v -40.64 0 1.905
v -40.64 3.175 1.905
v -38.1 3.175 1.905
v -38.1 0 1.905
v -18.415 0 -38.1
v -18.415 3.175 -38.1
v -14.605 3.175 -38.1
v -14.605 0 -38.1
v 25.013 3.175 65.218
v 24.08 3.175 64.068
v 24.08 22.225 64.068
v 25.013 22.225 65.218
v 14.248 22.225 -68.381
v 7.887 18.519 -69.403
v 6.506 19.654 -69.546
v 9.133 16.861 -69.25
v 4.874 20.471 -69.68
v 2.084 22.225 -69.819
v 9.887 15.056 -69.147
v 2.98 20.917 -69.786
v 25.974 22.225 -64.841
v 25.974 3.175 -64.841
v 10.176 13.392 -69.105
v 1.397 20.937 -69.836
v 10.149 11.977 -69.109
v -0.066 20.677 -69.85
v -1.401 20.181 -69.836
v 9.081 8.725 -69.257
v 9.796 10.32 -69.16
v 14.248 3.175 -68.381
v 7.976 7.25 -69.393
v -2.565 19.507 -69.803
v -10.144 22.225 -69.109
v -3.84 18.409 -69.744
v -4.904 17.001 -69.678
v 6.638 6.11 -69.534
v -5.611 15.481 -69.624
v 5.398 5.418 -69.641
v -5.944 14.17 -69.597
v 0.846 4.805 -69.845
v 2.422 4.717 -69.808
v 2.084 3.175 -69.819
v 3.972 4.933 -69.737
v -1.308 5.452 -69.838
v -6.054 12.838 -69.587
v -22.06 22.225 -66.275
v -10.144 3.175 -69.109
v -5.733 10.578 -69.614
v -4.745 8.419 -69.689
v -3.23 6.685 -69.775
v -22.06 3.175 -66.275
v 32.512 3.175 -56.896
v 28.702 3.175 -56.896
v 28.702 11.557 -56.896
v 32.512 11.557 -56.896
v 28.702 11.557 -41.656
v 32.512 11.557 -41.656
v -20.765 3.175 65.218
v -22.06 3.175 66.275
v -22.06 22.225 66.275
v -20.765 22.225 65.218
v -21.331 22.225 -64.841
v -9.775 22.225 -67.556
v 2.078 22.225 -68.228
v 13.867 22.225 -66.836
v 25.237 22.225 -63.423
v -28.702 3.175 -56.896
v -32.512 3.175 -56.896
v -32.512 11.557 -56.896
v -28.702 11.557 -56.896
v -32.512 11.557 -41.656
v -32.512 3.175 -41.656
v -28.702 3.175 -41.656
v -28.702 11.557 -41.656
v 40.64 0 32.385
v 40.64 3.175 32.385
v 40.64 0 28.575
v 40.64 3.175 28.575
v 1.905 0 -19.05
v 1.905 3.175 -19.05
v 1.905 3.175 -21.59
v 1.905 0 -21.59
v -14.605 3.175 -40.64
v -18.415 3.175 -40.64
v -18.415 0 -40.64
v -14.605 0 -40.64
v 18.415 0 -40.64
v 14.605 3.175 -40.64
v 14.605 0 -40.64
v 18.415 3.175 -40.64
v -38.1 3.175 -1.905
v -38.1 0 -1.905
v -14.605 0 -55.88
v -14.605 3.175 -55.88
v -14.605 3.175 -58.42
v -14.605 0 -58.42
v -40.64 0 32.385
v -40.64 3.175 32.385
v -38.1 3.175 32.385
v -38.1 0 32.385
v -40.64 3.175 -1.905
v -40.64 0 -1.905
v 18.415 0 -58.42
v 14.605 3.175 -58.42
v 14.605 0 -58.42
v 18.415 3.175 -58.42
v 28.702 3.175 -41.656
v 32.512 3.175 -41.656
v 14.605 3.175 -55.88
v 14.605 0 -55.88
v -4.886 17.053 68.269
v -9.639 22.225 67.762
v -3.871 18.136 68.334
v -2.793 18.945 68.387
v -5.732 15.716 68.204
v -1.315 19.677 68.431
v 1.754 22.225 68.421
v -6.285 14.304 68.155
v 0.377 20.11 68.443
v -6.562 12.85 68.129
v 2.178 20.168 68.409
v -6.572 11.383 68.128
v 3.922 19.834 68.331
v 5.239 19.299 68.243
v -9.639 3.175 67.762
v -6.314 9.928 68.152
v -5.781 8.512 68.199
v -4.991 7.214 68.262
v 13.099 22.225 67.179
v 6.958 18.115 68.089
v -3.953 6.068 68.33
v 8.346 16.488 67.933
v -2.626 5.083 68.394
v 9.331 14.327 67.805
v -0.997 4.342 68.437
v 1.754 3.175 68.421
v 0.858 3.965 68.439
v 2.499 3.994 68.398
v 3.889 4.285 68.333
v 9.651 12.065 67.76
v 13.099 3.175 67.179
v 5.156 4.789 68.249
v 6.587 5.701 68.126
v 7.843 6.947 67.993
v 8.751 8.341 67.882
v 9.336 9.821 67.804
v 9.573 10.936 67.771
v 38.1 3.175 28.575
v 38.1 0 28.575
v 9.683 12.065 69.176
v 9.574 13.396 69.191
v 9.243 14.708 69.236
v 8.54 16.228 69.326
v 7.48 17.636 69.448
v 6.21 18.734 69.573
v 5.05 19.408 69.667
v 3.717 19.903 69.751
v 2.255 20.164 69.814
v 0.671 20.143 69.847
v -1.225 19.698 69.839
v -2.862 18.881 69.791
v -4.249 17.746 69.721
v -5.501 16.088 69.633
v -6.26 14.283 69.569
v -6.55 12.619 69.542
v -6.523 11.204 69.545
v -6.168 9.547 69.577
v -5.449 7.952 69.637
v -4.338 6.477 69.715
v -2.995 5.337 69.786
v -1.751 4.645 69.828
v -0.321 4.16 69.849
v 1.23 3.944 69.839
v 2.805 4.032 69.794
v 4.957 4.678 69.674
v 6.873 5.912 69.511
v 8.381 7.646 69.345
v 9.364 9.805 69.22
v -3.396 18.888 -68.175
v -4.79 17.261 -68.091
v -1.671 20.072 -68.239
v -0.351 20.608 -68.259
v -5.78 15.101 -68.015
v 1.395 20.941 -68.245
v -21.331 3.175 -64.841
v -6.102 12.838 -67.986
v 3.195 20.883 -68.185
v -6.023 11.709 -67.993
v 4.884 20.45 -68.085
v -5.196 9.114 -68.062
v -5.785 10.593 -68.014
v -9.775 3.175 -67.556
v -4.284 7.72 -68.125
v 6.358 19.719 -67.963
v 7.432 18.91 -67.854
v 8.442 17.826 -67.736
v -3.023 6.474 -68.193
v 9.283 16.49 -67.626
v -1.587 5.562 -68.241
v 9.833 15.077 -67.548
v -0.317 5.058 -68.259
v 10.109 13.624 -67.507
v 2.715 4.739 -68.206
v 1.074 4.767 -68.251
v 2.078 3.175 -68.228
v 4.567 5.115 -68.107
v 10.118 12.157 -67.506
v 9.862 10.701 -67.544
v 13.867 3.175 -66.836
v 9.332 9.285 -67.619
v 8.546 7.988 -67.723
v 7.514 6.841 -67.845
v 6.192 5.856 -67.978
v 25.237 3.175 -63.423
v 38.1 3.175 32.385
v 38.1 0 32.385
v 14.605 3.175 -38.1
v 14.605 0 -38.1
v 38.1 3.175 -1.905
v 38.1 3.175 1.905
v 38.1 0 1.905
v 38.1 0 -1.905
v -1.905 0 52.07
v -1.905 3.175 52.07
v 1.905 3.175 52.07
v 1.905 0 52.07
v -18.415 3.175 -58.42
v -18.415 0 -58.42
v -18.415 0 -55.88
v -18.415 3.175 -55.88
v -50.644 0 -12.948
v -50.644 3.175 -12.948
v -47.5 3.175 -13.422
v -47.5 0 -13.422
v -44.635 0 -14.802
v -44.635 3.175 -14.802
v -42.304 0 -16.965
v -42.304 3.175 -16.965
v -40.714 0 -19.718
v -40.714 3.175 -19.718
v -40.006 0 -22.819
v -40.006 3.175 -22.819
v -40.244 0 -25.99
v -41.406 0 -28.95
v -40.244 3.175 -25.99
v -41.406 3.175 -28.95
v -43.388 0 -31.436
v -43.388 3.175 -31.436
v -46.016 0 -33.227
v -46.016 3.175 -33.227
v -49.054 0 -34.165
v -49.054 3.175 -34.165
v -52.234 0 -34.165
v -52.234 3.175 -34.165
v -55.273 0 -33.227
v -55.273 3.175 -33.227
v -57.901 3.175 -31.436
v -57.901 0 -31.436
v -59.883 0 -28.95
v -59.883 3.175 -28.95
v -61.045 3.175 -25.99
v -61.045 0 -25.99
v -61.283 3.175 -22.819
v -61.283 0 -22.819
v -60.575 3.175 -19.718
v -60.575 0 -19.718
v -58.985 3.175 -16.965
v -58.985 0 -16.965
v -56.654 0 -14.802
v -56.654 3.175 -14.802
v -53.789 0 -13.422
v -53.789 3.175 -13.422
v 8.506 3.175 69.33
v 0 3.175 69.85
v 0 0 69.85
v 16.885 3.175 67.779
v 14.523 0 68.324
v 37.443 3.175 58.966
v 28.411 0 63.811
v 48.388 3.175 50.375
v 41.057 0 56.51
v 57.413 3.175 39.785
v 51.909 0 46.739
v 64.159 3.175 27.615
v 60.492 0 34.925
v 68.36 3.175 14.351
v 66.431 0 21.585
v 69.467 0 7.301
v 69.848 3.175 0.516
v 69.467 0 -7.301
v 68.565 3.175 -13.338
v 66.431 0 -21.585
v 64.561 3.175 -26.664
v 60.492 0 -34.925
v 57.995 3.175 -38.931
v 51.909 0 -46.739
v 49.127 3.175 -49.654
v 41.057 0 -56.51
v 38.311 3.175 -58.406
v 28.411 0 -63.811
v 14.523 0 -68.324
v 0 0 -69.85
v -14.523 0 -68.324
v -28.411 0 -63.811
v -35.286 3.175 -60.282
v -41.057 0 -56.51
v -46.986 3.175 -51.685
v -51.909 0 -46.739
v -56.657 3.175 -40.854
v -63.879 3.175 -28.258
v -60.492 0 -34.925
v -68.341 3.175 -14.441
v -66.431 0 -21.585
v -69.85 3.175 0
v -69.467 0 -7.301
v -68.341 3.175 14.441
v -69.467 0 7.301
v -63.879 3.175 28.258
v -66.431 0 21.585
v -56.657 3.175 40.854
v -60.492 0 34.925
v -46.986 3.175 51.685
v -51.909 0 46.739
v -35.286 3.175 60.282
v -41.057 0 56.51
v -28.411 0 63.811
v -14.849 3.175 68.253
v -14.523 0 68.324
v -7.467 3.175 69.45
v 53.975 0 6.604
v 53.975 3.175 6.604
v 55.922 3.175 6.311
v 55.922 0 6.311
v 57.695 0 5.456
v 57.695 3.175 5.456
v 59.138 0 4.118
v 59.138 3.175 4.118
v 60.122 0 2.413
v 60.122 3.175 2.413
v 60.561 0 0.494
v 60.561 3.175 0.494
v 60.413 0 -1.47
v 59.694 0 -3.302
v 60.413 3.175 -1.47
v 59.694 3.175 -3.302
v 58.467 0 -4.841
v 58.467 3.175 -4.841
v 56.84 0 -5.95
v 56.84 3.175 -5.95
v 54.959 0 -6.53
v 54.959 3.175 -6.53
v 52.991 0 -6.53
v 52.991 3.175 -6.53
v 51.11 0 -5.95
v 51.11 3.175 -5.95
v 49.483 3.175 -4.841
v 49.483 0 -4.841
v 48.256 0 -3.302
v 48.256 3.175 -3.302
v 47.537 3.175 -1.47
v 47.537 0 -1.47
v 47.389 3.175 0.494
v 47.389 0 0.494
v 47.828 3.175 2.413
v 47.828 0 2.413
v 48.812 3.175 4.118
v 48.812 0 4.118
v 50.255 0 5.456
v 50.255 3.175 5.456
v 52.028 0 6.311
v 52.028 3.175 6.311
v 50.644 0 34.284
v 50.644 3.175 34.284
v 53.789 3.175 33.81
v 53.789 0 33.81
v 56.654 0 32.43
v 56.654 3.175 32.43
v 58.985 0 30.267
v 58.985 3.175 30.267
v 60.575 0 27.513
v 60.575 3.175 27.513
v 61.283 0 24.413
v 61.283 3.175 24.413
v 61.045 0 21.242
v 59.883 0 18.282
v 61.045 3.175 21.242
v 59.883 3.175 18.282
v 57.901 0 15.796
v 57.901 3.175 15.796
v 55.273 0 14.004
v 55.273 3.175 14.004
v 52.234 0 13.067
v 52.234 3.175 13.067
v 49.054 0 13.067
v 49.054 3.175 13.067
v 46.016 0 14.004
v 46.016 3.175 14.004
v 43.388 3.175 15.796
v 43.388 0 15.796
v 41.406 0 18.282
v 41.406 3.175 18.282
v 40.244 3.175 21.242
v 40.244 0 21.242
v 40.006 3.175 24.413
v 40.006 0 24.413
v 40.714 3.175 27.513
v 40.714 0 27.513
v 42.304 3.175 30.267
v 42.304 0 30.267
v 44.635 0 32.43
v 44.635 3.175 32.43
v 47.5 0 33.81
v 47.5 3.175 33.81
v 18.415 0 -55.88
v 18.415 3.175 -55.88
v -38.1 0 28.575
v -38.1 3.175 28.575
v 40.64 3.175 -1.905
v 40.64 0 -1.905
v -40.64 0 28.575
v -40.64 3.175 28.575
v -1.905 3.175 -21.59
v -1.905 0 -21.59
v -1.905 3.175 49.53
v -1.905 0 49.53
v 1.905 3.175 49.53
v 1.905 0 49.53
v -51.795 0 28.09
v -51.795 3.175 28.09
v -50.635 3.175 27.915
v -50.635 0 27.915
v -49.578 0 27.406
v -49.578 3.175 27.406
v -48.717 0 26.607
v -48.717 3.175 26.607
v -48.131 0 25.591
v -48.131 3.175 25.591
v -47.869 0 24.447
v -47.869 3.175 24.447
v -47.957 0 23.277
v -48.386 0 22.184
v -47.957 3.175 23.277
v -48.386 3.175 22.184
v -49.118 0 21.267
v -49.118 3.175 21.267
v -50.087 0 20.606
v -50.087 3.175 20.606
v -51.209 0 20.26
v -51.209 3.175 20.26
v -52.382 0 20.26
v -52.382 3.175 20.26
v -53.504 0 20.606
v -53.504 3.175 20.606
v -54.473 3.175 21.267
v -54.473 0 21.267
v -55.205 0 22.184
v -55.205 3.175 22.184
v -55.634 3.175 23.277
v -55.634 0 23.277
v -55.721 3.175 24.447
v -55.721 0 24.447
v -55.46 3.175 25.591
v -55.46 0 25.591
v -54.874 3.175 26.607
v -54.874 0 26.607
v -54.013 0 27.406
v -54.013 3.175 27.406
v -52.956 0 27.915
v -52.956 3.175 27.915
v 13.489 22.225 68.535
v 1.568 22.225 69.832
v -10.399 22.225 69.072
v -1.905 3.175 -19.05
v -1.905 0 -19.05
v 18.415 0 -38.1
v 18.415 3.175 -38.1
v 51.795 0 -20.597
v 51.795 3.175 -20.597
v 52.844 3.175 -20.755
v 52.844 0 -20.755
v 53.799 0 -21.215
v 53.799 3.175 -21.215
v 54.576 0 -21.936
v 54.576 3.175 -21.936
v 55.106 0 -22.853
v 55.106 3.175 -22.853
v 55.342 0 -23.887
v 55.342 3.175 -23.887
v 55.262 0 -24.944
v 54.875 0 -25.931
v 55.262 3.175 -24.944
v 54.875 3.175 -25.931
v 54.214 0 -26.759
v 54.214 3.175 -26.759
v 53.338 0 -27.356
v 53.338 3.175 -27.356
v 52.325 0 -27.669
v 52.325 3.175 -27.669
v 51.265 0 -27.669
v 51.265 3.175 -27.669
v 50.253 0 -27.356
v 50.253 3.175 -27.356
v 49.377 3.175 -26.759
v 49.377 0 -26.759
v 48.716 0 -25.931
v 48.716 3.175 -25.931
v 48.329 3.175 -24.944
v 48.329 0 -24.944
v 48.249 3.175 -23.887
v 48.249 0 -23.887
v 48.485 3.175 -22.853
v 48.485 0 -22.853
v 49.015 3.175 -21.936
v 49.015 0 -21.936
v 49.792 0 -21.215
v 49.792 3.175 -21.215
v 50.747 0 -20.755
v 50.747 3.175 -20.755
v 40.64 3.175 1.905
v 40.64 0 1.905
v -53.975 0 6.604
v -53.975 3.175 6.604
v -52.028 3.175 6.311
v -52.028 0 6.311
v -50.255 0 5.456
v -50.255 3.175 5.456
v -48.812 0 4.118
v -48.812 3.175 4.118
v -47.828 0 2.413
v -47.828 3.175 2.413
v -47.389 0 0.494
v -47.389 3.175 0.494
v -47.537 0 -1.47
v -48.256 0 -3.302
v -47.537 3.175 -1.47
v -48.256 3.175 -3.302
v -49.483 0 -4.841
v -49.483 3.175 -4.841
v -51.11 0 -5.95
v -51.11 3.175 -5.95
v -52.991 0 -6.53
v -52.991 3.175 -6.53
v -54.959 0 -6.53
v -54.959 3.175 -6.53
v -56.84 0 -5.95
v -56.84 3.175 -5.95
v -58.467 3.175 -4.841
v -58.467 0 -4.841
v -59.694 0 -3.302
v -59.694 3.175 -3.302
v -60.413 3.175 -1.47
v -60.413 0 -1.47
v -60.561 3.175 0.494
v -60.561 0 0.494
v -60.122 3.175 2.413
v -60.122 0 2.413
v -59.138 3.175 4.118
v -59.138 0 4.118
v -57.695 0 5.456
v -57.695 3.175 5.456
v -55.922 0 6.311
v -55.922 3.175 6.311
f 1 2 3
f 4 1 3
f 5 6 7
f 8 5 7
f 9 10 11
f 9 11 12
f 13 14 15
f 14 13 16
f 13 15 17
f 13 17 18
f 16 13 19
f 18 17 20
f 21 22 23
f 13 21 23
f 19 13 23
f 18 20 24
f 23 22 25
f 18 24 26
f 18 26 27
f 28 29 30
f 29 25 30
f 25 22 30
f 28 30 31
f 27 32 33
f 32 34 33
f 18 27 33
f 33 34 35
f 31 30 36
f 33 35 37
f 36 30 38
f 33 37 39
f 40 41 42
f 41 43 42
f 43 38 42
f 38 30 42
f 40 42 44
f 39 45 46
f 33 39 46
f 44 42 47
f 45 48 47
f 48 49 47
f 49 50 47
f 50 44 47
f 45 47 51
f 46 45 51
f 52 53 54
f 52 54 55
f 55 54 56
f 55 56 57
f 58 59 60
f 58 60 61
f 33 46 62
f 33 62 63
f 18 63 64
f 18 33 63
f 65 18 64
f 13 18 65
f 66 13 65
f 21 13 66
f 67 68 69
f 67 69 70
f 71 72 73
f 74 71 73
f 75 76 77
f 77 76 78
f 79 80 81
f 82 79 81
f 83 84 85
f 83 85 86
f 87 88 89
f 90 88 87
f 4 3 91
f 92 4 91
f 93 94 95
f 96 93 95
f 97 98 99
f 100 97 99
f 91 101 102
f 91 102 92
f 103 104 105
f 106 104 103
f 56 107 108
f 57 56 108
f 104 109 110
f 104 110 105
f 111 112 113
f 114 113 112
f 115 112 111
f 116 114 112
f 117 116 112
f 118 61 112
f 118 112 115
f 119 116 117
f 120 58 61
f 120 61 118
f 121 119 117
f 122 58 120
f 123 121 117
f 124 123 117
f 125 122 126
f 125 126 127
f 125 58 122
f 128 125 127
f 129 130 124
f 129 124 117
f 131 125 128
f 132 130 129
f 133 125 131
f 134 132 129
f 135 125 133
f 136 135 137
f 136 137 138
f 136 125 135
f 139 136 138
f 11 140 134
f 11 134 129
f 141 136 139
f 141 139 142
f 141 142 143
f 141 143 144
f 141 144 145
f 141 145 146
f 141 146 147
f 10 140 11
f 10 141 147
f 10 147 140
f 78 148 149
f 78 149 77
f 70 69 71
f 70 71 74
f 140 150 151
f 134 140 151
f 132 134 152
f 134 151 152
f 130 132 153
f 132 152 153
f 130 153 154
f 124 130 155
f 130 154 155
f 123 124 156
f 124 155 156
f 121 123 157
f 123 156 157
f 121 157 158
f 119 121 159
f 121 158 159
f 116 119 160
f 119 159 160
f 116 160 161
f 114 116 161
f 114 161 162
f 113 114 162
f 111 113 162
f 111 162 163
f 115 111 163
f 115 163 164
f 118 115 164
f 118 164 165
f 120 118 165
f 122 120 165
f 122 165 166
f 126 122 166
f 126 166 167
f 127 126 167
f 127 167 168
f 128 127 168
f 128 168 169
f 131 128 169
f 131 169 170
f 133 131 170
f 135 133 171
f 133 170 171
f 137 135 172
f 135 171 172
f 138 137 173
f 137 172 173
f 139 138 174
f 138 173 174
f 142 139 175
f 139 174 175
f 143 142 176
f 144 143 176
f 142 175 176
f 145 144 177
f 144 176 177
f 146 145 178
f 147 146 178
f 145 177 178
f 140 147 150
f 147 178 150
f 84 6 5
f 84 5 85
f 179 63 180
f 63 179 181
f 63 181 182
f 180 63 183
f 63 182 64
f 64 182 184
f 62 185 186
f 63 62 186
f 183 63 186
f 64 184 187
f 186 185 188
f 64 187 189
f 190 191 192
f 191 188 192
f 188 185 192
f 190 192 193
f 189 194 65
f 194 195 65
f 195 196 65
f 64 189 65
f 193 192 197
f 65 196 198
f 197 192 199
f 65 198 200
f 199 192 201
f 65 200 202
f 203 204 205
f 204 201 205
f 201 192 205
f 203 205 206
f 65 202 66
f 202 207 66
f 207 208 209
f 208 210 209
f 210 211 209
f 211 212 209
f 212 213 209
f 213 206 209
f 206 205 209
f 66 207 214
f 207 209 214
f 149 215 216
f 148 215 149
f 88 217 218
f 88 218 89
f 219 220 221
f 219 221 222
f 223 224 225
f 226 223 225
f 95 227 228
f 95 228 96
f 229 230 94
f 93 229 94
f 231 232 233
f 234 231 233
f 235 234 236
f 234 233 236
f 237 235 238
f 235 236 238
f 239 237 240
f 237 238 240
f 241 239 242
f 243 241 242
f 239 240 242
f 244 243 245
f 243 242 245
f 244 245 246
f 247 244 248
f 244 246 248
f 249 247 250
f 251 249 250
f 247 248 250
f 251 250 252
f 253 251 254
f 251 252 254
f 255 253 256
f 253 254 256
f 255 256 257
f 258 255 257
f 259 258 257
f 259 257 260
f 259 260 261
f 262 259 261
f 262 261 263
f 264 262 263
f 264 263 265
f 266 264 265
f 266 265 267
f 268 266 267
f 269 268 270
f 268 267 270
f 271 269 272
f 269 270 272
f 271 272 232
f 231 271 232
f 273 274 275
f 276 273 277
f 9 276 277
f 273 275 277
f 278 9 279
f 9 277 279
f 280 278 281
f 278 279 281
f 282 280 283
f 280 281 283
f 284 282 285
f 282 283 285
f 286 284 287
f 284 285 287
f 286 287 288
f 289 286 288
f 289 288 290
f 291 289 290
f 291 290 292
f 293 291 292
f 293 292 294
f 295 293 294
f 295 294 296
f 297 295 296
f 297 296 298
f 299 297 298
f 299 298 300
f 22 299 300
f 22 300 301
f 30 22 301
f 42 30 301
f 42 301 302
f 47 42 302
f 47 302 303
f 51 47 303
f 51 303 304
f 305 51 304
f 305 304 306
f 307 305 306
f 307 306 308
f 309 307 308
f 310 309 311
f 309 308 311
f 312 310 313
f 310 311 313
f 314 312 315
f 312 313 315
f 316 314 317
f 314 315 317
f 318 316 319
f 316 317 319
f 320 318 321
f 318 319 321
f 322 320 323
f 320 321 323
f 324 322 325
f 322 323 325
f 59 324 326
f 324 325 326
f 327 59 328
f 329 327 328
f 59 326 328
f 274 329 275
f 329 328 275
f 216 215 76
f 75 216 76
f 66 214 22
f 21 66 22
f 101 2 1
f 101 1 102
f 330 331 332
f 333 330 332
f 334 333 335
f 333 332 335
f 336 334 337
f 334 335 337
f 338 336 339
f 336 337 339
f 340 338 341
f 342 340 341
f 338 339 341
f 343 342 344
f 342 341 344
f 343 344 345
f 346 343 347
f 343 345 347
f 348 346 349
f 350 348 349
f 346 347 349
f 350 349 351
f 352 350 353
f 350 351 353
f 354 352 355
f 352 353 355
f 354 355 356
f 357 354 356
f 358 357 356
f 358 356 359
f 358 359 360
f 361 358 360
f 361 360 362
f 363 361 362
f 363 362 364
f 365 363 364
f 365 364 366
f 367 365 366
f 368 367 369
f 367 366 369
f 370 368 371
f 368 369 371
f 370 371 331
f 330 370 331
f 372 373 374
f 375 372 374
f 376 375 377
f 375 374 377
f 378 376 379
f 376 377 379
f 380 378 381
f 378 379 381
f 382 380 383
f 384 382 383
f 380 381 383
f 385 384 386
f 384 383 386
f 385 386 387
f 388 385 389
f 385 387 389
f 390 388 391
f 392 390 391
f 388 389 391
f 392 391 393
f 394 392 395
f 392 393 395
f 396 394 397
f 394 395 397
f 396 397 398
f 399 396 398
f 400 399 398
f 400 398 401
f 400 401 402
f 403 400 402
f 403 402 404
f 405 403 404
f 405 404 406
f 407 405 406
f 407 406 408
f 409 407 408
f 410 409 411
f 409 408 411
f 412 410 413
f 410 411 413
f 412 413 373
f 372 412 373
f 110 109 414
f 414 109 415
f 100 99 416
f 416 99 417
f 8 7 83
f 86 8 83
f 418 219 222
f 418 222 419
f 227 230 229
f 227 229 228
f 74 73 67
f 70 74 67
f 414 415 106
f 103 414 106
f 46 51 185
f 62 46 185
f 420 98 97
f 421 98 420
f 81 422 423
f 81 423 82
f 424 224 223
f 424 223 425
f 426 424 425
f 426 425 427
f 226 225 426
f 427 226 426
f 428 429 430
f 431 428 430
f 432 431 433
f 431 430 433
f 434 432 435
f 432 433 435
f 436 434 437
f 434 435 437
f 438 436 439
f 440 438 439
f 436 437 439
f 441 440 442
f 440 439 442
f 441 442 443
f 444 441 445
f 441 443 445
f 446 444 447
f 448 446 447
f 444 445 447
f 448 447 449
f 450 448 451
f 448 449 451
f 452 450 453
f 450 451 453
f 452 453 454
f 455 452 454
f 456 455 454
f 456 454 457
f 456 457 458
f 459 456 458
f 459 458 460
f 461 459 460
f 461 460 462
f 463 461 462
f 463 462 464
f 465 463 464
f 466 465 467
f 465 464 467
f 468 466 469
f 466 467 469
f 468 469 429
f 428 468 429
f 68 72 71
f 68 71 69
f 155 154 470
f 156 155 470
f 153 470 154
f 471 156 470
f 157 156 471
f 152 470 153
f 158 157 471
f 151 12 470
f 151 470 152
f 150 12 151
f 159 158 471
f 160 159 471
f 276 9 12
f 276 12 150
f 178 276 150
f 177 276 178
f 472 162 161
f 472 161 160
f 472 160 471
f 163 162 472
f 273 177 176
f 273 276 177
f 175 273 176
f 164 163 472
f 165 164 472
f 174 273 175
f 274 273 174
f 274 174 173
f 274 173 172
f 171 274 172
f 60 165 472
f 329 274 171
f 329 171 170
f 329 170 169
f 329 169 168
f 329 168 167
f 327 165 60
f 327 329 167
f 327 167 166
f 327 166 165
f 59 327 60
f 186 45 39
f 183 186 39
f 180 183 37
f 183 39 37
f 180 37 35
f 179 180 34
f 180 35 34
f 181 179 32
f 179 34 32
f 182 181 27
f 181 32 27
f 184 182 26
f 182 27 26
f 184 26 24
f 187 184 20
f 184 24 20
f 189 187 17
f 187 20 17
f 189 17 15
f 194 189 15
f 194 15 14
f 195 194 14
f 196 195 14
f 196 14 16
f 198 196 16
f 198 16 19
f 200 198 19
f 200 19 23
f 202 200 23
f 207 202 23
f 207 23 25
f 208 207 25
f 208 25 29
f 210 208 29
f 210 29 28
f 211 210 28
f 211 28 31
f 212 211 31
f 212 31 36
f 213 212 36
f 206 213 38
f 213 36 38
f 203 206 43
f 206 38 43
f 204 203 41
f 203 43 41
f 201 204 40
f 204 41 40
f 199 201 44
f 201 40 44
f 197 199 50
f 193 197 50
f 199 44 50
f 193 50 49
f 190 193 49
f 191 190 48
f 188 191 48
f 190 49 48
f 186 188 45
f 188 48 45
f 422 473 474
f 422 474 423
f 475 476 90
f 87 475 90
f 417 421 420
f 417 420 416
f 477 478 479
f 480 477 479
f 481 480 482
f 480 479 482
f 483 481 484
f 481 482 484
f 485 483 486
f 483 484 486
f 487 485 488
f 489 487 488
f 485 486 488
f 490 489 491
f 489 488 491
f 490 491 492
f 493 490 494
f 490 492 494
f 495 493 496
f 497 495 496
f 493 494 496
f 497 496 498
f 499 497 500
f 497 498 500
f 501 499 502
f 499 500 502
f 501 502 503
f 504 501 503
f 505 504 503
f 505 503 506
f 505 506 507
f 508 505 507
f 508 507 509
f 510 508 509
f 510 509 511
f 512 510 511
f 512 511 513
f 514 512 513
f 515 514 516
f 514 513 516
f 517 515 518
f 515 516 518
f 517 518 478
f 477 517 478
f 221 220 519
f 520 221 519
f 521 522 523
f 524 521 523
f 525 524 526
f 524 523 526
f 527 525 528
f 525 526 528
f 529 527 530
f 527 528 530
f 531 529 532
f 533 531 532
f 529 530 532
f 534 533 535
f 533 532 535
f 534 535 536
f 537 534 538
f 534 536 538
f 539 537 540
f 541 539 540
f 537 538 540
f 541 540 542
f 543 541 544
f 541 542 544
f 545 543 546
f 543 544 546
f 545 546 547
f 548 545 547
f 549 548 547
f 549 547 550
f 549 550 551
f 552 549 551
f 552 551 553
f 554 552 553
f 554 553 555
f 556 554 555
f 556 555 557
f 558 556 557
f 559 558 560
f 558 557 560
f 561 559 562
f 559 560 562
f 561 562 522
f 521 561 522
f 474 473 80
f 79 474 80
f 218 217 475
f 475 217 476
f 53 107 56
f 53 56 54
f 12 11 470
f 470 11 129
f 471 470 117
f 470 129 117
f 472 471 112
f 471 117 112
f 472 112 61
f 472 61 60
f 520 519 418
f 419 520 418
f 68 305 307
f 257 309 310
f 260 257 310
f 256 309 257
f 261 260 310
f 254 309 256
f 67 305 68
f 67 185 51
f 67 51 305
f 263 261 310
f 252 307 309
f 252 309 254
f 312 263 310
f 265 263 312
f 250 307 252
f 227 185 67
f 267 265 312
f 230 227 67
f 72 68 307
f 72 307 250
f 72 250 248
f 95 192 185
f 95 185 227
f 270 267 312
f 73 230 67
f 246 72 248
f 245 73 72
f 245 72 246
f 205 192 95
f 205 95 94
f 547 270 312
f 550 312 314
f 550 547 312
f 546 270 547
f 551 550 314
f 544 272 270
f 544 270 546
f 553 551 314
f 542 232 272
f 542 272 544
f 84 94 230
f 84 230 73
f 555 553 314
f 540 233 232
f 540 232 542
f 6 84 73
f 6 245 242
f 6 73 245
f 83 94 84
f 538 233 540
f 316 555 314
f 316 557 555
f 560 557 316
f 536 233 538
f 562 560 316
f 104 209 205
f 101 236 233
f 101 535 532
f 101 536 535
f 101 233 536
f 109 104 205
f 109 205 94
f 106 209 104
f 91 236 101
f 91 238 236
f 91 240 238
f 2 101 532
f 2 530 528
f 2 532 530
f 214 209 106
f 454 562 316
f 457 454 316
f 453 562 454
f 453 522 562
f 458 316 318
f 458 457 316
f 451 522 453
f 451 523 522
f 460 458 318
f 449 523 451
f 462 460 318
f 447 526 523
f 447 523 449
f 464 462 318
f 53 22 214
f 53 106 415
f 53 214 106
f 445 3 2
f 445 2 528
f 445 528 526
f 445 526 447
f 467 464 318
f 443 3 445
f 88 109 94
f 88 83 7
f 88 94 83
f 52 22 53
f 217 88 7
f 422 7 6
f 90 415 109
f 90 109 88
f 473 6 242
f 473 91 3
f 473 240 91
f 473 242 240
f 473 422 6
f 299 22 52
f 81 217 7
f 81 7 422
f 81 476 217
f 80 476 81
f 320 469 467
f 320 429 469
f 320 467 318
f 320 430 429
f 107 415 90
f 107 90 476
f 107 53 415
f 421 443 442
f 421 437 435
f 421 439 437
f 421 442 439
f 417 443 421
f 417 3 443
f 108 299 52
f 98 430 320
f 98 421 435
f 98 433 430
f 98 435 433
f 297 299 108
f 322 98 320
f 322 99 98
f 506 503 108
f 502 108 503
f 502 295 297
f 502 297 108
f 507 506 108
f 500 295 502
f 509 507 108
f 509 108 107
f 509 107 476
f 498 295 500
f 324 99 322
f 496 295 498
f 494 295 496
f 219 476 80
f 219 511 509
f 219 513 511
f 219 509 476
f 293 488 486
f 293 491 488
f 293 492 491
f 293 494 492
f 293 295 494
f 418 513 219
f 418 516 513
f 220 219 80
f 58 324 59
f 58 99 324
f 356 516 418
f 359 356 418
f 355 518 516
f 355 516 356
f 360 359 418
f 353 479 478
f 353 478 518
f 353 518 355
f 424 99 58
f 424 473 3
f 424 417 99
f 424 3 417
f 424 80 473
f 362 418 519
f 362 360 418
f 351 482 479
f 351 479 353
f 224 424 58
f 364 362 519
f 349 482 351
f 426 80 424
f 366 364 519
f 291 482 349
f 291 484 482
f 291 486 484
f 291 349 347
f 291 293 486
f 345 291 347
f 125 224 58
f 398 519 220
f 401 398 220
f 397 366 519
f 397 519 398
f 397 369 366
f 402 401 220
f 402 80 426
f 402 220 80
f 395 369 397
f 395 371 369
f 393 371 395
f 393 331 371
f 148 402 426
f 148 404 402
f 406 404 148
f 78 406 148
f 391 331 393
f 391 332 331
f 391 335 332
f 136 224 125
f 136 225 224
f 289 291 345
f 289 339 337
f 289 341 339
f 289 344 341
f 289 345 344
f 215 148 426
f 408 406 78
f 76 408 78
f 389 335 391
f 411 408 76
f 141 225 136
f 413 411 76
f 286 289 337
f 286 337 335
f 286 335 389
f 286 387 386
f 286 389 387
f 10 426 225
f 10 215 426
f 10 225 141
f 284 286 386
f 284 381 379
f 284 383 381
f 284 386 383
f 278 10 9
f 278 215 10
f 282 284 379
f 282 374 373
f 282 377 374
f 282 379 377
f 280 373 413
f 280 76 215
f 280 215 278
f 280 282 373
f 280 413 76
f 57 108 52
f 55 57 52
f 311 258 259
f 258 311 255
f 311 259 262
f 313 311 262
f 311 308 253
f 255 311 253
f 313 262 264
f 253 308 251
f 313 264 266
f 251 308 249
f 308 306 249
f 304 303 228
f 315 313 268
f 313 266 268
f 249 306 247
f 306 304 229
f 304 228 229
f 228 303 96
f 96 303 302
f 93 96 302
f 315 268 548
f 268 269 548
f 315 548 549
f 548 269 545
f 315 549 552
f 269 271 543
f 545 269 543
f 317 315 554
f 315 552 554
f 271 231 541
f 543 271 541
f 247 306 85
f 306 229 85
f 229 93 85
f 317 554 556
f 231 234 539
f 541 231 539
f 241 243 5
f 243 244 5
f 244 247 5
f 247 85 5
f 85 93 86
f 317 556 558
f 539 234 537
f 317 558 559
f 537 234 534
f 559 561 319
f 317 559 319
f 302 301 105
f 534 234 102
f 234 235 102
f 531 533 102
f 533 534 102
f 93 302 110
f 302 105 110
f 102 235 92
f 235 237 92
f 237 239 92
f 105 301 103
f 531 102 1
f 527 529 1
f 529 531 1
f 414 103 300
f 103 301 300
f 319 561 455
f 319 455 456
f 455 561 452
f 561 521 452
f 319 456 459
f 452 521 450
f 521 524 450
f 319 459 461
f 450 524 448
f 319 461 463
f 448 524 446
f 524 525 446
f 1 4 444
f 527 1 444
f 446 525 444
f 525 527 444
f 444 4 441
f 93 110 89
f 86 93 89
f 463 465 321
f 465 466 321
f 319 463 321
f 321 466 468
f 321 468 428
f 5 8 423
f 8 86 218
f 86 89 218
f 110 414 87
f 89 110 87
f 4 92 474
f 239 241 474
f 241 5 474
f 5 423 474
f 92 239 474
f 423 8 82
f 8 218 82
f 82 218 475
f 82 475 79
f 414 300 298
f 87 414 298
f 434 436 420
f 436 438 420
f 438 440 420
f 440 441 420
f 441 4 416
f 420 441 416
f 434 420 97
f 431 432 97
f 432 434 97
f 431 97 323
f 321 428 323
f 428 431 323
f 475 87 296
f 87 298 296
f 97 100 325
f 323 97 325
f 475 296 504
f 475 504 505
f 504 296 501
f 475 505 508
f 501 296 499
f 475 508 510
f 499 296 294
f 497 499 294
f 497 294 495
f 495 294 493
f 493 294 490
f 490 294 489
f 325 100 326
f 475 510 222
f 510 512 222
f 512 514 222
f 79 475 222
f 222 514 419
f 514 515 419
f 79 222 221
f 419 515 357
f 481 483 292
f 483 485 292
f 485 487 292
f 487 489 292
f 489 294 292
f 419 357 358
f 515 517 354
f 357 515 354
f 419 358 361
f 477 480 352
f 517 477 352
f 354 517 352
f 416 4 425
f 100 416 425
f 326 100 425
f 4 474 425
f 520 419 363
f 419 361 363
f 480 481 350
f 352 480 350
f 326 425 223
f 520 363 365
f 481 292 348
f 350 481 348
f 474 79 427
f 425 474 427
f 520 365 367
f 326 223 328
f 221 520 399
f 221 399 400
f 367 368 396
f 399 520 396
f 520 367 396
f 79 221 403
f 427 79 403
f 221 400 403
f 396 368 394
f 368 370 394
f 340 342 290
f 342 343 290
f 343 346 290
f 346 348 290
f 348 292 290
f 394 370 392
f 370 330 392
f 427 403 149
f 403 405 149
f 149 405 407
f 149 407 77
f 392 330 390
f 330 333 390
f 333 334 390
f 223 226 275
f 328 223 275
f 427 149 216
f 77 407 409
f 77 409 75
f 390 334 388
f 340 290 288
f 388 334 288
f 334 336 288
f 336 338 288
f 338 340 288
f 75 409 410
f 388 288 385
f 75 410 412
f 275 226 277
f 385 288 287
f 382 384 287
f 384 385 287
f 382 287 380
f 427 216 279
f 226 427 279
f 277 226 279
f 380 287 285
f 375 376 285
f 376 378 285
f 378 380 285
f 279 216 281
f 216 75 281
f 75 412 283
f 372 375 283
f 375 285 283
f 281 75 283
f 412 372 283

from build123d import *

# Parameters (mm, degrees)
SKETCH1_R           = 69.85
BOSS_EXTRUDE1_DEPTH = 3.175
SKETCH2_R           = 6.604
SKETCH2_R_2         = 3.937
SKETCH2_R_3         = 3.556
SKETCH2_R_4         = 10.668
CUT_EXTRUDE1_DEPTH  = 3.175
SKETCH3_W           = 3.81
SKETCH3_H           = 15.24
BOSS_EXTRUDE2_DEPTH = 8.382
SKETCH3_4_W         = 2.54
SKETCH3_4_H         = 3.81
SKETCH3_4_W_2       = 3.81
SKETCH3_4_H_2       = 2.54
CUT_EXTRUDE2_DEPTH  = 8.382
SKETCH4_W           = 3.81
SKETCH4_H           = 15.24
BOSS_EXTRUDE4_DEPTH = 8.382
BOSS_EXTRUDE5_DEPTH = 19.05
SKETCH6_R           = 8.128
CUT_EXTRUDE3_DEPTH  = 19.05
SKETCH7_R           = 8.128
CUT_EXTRUDE4_DEPTH  = 19.05


with BuildPart() as part:
    # Sketch1 → Boss-Extrude1 (new body)
    with BuildSketch(Plane(origin=(0, 0, 0), x_dir=(1, 0, 0), z_dir=(0, 1, 0))):
        with Locations(Location((0, 0, 0), (0, 0, 270))):
            Circle(SKETCH1_R)
    extrude(amount=BOSS_EXTRUDE1_DEPTH)

    # Sketch2 → Cut-Extrude1 (cut)
    with BuildSketch(Plane(origin=(0, 3.175, 0), x_dir=(1, 0, 0), z_dir=(0, 1, 0))):
        with Locations(Location((-53.975, 0, 0), (0, 0, 270))):
            Circle(SKETCH2_R)
        with Locations(Location((53.975, 0, 0), (0, 0, 270))):
            Circle(SKETCH2_R)
        with Locations(Location((-51.795490029, -24.152633658, 0), (0, 0, 270))):
            Circle(SKETCH2_R_2)
        with Locations(Location((51.795490029, 24.152633658, 0), (0, 0, 270))):
            Circle(SKETCH2_R_3)
        with Locations(Location((50.64447914, -23.615908466, 0), (0, 0, 270))):
            Circle(SKETCH2_R_4)
        with Locations(Location((-50.64447914, 23.615908466, 0), (0, 0, 270))):
            Circle(SKETCH2_R_4)
    extrude(amount=-CUT_EXTRUDE1_DEPTH, mode=Mode.SUBTRACT)

    # Sketch3 → Boss-Extrude2 (add)
    with BuildSketch(Plane(origin=(0, 3.175, 0), x_dir=(1, 0, 0), z_dir=(0, 1, 0))):
        with Locations((-30.607, 49.276)):
            Rectangle(SKETCH3_W, SKETCH3_H)
    extrude(amount=BOSS_EXTRUDE2_DEPTH)

    # Sketch3<4> → Cut-Extrude2 (cut)
    with BuildSketch(Plane(origin=(0, 3.175, 0), x_dir=(1, 0, 0), z_dir=(0, 1, 0))):
        with Locations((-39.37, 0)):
            Rectangle(SKETCH3_4_W, SKETCH3_4_H)
        with Locations((-39.37, -30.48)):
            Rectangle(SKETCH3_4_W, SKETCH3_4_H)
        with Locations((39.37, -30.48)):
            Rectangle(SKETCH3_4_W, SKETCH3_4_H)
        with Locations((39.37, 0)):
            Rectangle(SKETCH3_4_W, SKETCH3_4_H)
        with Locations((0, 20.32)):
            Rectangle(SKETCH3_4_W_2, SKETCH3_4_H_2)
        with Locations((0, -50.8)):
            Rectangle(SKETCH3_4_W_2, SKETCH3_4_H_2)
        with Locations((-16.51, 57.15)):
            Rectangle(SKETCH3_4_W_2, SKETCH3_4_H_2)
        with Locations((16.51, 57.15)):
            Rectangle(SKETCH3_4_W_2, SKETCH3_4_H_2)
        with Locations((16.51, 39.37)):
            Rectangle(SKETCH3_4_W_2, SKETCH3_4_H_2)
        with Locations((-16.51, 39.37)):
            Rectangle(SKETCH3_4_W_2, SKETCH3_4_H_2)
    extrude(amount=-CUT_EXTRUDE2_DEPTH, mode=Mode.SUBTRACT)

    # Sketch4 → Boss-Extrude4 (add)
    with BuildSketch(Plane(origin=(0, 3.175, 0), x_dir=(1, 0, 0), z_dir=(0, 1, 0))):
        with Locations((30.607, 49.276)):
            Rectangle(SKETCH4_W, SKETCH4_H)
    extrude(amount=BOSS_EXTRUDE4_DEPTH)

    # Sketch5 → Boss-Extrude5 (add)
    with BuildSketch(Plane(origin=(0, 3.175, 0), x_dir=(1, 0, 0), z_dir=(0, 1, 0))):
        with BuildLine():
            Line((-22.060225105, 66.27494978), (-21.331257294, 64.841108186))
            ThreePointArc((-21.331257294, 64.841108186), (2.077551681, 68.228114642), (25.236913051, 63.423103584))
            Line((25.236913051, 63.423103584), (25.974086879, 64.841108186))
            ThreePointArc((25.974086879, 64.841108186), (2.084119461, 69.818901066), (-22.060225105, 66.27494978))
        make_face()
        with BuildLine():
            Line((-22.060225105, -66.27494978), (-20.764940728, -65.218037135))
            ThreePointArc((-20.764940728, -65.218037135), (1.754255855, -68.421471174), (24.07970803, -64.068266657))
            Line((24.07970803, -64.068266657), (25.012599469, -65.218037135))
            ThreePointArc((25.012599469, -65.218037135), (1.567926874, -69.832400111), (-22.060225105, -66.27494978))
        make_face()
    extrude(amount=BOSS_EXTRUDE5_DEPTH)

    # Sketch6 → Cut-Extrude3 (cut)
    with BuildSketch(Plane(origin=(2.084119461, 22.225, -69.818901066), x_dir=(-0.9995547754627743, 0, -0.02983707173237782), z_dir=(0.029837071732377825, 0, -0.9995547754627744))):
        with Locations((0, -9.386828468)):
            Circle(SKETCH6_R)
    extrude(amount=-CUT_EXTRUDE3_DEPTH, mode=Mode.SUBTRACT)

    # Sketch7 → Cut-Extrude4 (cut)
    with BuildSketch(Plane(origin=(1.567926874, 22.225, 69.832400111), x_dir=(0.9997480330908115, 0, -0.022447056177901516), z_dir=(0.022447056177901513, 0, 0.9997480330908114))):
        with Locations((0, -10.16)):
            Circle(SKETCH7_R)
    extrude(amount=-CUT_EXTRUDE4_DEPTH, mode=Mode.SUBTRACT)


solid = part.part
